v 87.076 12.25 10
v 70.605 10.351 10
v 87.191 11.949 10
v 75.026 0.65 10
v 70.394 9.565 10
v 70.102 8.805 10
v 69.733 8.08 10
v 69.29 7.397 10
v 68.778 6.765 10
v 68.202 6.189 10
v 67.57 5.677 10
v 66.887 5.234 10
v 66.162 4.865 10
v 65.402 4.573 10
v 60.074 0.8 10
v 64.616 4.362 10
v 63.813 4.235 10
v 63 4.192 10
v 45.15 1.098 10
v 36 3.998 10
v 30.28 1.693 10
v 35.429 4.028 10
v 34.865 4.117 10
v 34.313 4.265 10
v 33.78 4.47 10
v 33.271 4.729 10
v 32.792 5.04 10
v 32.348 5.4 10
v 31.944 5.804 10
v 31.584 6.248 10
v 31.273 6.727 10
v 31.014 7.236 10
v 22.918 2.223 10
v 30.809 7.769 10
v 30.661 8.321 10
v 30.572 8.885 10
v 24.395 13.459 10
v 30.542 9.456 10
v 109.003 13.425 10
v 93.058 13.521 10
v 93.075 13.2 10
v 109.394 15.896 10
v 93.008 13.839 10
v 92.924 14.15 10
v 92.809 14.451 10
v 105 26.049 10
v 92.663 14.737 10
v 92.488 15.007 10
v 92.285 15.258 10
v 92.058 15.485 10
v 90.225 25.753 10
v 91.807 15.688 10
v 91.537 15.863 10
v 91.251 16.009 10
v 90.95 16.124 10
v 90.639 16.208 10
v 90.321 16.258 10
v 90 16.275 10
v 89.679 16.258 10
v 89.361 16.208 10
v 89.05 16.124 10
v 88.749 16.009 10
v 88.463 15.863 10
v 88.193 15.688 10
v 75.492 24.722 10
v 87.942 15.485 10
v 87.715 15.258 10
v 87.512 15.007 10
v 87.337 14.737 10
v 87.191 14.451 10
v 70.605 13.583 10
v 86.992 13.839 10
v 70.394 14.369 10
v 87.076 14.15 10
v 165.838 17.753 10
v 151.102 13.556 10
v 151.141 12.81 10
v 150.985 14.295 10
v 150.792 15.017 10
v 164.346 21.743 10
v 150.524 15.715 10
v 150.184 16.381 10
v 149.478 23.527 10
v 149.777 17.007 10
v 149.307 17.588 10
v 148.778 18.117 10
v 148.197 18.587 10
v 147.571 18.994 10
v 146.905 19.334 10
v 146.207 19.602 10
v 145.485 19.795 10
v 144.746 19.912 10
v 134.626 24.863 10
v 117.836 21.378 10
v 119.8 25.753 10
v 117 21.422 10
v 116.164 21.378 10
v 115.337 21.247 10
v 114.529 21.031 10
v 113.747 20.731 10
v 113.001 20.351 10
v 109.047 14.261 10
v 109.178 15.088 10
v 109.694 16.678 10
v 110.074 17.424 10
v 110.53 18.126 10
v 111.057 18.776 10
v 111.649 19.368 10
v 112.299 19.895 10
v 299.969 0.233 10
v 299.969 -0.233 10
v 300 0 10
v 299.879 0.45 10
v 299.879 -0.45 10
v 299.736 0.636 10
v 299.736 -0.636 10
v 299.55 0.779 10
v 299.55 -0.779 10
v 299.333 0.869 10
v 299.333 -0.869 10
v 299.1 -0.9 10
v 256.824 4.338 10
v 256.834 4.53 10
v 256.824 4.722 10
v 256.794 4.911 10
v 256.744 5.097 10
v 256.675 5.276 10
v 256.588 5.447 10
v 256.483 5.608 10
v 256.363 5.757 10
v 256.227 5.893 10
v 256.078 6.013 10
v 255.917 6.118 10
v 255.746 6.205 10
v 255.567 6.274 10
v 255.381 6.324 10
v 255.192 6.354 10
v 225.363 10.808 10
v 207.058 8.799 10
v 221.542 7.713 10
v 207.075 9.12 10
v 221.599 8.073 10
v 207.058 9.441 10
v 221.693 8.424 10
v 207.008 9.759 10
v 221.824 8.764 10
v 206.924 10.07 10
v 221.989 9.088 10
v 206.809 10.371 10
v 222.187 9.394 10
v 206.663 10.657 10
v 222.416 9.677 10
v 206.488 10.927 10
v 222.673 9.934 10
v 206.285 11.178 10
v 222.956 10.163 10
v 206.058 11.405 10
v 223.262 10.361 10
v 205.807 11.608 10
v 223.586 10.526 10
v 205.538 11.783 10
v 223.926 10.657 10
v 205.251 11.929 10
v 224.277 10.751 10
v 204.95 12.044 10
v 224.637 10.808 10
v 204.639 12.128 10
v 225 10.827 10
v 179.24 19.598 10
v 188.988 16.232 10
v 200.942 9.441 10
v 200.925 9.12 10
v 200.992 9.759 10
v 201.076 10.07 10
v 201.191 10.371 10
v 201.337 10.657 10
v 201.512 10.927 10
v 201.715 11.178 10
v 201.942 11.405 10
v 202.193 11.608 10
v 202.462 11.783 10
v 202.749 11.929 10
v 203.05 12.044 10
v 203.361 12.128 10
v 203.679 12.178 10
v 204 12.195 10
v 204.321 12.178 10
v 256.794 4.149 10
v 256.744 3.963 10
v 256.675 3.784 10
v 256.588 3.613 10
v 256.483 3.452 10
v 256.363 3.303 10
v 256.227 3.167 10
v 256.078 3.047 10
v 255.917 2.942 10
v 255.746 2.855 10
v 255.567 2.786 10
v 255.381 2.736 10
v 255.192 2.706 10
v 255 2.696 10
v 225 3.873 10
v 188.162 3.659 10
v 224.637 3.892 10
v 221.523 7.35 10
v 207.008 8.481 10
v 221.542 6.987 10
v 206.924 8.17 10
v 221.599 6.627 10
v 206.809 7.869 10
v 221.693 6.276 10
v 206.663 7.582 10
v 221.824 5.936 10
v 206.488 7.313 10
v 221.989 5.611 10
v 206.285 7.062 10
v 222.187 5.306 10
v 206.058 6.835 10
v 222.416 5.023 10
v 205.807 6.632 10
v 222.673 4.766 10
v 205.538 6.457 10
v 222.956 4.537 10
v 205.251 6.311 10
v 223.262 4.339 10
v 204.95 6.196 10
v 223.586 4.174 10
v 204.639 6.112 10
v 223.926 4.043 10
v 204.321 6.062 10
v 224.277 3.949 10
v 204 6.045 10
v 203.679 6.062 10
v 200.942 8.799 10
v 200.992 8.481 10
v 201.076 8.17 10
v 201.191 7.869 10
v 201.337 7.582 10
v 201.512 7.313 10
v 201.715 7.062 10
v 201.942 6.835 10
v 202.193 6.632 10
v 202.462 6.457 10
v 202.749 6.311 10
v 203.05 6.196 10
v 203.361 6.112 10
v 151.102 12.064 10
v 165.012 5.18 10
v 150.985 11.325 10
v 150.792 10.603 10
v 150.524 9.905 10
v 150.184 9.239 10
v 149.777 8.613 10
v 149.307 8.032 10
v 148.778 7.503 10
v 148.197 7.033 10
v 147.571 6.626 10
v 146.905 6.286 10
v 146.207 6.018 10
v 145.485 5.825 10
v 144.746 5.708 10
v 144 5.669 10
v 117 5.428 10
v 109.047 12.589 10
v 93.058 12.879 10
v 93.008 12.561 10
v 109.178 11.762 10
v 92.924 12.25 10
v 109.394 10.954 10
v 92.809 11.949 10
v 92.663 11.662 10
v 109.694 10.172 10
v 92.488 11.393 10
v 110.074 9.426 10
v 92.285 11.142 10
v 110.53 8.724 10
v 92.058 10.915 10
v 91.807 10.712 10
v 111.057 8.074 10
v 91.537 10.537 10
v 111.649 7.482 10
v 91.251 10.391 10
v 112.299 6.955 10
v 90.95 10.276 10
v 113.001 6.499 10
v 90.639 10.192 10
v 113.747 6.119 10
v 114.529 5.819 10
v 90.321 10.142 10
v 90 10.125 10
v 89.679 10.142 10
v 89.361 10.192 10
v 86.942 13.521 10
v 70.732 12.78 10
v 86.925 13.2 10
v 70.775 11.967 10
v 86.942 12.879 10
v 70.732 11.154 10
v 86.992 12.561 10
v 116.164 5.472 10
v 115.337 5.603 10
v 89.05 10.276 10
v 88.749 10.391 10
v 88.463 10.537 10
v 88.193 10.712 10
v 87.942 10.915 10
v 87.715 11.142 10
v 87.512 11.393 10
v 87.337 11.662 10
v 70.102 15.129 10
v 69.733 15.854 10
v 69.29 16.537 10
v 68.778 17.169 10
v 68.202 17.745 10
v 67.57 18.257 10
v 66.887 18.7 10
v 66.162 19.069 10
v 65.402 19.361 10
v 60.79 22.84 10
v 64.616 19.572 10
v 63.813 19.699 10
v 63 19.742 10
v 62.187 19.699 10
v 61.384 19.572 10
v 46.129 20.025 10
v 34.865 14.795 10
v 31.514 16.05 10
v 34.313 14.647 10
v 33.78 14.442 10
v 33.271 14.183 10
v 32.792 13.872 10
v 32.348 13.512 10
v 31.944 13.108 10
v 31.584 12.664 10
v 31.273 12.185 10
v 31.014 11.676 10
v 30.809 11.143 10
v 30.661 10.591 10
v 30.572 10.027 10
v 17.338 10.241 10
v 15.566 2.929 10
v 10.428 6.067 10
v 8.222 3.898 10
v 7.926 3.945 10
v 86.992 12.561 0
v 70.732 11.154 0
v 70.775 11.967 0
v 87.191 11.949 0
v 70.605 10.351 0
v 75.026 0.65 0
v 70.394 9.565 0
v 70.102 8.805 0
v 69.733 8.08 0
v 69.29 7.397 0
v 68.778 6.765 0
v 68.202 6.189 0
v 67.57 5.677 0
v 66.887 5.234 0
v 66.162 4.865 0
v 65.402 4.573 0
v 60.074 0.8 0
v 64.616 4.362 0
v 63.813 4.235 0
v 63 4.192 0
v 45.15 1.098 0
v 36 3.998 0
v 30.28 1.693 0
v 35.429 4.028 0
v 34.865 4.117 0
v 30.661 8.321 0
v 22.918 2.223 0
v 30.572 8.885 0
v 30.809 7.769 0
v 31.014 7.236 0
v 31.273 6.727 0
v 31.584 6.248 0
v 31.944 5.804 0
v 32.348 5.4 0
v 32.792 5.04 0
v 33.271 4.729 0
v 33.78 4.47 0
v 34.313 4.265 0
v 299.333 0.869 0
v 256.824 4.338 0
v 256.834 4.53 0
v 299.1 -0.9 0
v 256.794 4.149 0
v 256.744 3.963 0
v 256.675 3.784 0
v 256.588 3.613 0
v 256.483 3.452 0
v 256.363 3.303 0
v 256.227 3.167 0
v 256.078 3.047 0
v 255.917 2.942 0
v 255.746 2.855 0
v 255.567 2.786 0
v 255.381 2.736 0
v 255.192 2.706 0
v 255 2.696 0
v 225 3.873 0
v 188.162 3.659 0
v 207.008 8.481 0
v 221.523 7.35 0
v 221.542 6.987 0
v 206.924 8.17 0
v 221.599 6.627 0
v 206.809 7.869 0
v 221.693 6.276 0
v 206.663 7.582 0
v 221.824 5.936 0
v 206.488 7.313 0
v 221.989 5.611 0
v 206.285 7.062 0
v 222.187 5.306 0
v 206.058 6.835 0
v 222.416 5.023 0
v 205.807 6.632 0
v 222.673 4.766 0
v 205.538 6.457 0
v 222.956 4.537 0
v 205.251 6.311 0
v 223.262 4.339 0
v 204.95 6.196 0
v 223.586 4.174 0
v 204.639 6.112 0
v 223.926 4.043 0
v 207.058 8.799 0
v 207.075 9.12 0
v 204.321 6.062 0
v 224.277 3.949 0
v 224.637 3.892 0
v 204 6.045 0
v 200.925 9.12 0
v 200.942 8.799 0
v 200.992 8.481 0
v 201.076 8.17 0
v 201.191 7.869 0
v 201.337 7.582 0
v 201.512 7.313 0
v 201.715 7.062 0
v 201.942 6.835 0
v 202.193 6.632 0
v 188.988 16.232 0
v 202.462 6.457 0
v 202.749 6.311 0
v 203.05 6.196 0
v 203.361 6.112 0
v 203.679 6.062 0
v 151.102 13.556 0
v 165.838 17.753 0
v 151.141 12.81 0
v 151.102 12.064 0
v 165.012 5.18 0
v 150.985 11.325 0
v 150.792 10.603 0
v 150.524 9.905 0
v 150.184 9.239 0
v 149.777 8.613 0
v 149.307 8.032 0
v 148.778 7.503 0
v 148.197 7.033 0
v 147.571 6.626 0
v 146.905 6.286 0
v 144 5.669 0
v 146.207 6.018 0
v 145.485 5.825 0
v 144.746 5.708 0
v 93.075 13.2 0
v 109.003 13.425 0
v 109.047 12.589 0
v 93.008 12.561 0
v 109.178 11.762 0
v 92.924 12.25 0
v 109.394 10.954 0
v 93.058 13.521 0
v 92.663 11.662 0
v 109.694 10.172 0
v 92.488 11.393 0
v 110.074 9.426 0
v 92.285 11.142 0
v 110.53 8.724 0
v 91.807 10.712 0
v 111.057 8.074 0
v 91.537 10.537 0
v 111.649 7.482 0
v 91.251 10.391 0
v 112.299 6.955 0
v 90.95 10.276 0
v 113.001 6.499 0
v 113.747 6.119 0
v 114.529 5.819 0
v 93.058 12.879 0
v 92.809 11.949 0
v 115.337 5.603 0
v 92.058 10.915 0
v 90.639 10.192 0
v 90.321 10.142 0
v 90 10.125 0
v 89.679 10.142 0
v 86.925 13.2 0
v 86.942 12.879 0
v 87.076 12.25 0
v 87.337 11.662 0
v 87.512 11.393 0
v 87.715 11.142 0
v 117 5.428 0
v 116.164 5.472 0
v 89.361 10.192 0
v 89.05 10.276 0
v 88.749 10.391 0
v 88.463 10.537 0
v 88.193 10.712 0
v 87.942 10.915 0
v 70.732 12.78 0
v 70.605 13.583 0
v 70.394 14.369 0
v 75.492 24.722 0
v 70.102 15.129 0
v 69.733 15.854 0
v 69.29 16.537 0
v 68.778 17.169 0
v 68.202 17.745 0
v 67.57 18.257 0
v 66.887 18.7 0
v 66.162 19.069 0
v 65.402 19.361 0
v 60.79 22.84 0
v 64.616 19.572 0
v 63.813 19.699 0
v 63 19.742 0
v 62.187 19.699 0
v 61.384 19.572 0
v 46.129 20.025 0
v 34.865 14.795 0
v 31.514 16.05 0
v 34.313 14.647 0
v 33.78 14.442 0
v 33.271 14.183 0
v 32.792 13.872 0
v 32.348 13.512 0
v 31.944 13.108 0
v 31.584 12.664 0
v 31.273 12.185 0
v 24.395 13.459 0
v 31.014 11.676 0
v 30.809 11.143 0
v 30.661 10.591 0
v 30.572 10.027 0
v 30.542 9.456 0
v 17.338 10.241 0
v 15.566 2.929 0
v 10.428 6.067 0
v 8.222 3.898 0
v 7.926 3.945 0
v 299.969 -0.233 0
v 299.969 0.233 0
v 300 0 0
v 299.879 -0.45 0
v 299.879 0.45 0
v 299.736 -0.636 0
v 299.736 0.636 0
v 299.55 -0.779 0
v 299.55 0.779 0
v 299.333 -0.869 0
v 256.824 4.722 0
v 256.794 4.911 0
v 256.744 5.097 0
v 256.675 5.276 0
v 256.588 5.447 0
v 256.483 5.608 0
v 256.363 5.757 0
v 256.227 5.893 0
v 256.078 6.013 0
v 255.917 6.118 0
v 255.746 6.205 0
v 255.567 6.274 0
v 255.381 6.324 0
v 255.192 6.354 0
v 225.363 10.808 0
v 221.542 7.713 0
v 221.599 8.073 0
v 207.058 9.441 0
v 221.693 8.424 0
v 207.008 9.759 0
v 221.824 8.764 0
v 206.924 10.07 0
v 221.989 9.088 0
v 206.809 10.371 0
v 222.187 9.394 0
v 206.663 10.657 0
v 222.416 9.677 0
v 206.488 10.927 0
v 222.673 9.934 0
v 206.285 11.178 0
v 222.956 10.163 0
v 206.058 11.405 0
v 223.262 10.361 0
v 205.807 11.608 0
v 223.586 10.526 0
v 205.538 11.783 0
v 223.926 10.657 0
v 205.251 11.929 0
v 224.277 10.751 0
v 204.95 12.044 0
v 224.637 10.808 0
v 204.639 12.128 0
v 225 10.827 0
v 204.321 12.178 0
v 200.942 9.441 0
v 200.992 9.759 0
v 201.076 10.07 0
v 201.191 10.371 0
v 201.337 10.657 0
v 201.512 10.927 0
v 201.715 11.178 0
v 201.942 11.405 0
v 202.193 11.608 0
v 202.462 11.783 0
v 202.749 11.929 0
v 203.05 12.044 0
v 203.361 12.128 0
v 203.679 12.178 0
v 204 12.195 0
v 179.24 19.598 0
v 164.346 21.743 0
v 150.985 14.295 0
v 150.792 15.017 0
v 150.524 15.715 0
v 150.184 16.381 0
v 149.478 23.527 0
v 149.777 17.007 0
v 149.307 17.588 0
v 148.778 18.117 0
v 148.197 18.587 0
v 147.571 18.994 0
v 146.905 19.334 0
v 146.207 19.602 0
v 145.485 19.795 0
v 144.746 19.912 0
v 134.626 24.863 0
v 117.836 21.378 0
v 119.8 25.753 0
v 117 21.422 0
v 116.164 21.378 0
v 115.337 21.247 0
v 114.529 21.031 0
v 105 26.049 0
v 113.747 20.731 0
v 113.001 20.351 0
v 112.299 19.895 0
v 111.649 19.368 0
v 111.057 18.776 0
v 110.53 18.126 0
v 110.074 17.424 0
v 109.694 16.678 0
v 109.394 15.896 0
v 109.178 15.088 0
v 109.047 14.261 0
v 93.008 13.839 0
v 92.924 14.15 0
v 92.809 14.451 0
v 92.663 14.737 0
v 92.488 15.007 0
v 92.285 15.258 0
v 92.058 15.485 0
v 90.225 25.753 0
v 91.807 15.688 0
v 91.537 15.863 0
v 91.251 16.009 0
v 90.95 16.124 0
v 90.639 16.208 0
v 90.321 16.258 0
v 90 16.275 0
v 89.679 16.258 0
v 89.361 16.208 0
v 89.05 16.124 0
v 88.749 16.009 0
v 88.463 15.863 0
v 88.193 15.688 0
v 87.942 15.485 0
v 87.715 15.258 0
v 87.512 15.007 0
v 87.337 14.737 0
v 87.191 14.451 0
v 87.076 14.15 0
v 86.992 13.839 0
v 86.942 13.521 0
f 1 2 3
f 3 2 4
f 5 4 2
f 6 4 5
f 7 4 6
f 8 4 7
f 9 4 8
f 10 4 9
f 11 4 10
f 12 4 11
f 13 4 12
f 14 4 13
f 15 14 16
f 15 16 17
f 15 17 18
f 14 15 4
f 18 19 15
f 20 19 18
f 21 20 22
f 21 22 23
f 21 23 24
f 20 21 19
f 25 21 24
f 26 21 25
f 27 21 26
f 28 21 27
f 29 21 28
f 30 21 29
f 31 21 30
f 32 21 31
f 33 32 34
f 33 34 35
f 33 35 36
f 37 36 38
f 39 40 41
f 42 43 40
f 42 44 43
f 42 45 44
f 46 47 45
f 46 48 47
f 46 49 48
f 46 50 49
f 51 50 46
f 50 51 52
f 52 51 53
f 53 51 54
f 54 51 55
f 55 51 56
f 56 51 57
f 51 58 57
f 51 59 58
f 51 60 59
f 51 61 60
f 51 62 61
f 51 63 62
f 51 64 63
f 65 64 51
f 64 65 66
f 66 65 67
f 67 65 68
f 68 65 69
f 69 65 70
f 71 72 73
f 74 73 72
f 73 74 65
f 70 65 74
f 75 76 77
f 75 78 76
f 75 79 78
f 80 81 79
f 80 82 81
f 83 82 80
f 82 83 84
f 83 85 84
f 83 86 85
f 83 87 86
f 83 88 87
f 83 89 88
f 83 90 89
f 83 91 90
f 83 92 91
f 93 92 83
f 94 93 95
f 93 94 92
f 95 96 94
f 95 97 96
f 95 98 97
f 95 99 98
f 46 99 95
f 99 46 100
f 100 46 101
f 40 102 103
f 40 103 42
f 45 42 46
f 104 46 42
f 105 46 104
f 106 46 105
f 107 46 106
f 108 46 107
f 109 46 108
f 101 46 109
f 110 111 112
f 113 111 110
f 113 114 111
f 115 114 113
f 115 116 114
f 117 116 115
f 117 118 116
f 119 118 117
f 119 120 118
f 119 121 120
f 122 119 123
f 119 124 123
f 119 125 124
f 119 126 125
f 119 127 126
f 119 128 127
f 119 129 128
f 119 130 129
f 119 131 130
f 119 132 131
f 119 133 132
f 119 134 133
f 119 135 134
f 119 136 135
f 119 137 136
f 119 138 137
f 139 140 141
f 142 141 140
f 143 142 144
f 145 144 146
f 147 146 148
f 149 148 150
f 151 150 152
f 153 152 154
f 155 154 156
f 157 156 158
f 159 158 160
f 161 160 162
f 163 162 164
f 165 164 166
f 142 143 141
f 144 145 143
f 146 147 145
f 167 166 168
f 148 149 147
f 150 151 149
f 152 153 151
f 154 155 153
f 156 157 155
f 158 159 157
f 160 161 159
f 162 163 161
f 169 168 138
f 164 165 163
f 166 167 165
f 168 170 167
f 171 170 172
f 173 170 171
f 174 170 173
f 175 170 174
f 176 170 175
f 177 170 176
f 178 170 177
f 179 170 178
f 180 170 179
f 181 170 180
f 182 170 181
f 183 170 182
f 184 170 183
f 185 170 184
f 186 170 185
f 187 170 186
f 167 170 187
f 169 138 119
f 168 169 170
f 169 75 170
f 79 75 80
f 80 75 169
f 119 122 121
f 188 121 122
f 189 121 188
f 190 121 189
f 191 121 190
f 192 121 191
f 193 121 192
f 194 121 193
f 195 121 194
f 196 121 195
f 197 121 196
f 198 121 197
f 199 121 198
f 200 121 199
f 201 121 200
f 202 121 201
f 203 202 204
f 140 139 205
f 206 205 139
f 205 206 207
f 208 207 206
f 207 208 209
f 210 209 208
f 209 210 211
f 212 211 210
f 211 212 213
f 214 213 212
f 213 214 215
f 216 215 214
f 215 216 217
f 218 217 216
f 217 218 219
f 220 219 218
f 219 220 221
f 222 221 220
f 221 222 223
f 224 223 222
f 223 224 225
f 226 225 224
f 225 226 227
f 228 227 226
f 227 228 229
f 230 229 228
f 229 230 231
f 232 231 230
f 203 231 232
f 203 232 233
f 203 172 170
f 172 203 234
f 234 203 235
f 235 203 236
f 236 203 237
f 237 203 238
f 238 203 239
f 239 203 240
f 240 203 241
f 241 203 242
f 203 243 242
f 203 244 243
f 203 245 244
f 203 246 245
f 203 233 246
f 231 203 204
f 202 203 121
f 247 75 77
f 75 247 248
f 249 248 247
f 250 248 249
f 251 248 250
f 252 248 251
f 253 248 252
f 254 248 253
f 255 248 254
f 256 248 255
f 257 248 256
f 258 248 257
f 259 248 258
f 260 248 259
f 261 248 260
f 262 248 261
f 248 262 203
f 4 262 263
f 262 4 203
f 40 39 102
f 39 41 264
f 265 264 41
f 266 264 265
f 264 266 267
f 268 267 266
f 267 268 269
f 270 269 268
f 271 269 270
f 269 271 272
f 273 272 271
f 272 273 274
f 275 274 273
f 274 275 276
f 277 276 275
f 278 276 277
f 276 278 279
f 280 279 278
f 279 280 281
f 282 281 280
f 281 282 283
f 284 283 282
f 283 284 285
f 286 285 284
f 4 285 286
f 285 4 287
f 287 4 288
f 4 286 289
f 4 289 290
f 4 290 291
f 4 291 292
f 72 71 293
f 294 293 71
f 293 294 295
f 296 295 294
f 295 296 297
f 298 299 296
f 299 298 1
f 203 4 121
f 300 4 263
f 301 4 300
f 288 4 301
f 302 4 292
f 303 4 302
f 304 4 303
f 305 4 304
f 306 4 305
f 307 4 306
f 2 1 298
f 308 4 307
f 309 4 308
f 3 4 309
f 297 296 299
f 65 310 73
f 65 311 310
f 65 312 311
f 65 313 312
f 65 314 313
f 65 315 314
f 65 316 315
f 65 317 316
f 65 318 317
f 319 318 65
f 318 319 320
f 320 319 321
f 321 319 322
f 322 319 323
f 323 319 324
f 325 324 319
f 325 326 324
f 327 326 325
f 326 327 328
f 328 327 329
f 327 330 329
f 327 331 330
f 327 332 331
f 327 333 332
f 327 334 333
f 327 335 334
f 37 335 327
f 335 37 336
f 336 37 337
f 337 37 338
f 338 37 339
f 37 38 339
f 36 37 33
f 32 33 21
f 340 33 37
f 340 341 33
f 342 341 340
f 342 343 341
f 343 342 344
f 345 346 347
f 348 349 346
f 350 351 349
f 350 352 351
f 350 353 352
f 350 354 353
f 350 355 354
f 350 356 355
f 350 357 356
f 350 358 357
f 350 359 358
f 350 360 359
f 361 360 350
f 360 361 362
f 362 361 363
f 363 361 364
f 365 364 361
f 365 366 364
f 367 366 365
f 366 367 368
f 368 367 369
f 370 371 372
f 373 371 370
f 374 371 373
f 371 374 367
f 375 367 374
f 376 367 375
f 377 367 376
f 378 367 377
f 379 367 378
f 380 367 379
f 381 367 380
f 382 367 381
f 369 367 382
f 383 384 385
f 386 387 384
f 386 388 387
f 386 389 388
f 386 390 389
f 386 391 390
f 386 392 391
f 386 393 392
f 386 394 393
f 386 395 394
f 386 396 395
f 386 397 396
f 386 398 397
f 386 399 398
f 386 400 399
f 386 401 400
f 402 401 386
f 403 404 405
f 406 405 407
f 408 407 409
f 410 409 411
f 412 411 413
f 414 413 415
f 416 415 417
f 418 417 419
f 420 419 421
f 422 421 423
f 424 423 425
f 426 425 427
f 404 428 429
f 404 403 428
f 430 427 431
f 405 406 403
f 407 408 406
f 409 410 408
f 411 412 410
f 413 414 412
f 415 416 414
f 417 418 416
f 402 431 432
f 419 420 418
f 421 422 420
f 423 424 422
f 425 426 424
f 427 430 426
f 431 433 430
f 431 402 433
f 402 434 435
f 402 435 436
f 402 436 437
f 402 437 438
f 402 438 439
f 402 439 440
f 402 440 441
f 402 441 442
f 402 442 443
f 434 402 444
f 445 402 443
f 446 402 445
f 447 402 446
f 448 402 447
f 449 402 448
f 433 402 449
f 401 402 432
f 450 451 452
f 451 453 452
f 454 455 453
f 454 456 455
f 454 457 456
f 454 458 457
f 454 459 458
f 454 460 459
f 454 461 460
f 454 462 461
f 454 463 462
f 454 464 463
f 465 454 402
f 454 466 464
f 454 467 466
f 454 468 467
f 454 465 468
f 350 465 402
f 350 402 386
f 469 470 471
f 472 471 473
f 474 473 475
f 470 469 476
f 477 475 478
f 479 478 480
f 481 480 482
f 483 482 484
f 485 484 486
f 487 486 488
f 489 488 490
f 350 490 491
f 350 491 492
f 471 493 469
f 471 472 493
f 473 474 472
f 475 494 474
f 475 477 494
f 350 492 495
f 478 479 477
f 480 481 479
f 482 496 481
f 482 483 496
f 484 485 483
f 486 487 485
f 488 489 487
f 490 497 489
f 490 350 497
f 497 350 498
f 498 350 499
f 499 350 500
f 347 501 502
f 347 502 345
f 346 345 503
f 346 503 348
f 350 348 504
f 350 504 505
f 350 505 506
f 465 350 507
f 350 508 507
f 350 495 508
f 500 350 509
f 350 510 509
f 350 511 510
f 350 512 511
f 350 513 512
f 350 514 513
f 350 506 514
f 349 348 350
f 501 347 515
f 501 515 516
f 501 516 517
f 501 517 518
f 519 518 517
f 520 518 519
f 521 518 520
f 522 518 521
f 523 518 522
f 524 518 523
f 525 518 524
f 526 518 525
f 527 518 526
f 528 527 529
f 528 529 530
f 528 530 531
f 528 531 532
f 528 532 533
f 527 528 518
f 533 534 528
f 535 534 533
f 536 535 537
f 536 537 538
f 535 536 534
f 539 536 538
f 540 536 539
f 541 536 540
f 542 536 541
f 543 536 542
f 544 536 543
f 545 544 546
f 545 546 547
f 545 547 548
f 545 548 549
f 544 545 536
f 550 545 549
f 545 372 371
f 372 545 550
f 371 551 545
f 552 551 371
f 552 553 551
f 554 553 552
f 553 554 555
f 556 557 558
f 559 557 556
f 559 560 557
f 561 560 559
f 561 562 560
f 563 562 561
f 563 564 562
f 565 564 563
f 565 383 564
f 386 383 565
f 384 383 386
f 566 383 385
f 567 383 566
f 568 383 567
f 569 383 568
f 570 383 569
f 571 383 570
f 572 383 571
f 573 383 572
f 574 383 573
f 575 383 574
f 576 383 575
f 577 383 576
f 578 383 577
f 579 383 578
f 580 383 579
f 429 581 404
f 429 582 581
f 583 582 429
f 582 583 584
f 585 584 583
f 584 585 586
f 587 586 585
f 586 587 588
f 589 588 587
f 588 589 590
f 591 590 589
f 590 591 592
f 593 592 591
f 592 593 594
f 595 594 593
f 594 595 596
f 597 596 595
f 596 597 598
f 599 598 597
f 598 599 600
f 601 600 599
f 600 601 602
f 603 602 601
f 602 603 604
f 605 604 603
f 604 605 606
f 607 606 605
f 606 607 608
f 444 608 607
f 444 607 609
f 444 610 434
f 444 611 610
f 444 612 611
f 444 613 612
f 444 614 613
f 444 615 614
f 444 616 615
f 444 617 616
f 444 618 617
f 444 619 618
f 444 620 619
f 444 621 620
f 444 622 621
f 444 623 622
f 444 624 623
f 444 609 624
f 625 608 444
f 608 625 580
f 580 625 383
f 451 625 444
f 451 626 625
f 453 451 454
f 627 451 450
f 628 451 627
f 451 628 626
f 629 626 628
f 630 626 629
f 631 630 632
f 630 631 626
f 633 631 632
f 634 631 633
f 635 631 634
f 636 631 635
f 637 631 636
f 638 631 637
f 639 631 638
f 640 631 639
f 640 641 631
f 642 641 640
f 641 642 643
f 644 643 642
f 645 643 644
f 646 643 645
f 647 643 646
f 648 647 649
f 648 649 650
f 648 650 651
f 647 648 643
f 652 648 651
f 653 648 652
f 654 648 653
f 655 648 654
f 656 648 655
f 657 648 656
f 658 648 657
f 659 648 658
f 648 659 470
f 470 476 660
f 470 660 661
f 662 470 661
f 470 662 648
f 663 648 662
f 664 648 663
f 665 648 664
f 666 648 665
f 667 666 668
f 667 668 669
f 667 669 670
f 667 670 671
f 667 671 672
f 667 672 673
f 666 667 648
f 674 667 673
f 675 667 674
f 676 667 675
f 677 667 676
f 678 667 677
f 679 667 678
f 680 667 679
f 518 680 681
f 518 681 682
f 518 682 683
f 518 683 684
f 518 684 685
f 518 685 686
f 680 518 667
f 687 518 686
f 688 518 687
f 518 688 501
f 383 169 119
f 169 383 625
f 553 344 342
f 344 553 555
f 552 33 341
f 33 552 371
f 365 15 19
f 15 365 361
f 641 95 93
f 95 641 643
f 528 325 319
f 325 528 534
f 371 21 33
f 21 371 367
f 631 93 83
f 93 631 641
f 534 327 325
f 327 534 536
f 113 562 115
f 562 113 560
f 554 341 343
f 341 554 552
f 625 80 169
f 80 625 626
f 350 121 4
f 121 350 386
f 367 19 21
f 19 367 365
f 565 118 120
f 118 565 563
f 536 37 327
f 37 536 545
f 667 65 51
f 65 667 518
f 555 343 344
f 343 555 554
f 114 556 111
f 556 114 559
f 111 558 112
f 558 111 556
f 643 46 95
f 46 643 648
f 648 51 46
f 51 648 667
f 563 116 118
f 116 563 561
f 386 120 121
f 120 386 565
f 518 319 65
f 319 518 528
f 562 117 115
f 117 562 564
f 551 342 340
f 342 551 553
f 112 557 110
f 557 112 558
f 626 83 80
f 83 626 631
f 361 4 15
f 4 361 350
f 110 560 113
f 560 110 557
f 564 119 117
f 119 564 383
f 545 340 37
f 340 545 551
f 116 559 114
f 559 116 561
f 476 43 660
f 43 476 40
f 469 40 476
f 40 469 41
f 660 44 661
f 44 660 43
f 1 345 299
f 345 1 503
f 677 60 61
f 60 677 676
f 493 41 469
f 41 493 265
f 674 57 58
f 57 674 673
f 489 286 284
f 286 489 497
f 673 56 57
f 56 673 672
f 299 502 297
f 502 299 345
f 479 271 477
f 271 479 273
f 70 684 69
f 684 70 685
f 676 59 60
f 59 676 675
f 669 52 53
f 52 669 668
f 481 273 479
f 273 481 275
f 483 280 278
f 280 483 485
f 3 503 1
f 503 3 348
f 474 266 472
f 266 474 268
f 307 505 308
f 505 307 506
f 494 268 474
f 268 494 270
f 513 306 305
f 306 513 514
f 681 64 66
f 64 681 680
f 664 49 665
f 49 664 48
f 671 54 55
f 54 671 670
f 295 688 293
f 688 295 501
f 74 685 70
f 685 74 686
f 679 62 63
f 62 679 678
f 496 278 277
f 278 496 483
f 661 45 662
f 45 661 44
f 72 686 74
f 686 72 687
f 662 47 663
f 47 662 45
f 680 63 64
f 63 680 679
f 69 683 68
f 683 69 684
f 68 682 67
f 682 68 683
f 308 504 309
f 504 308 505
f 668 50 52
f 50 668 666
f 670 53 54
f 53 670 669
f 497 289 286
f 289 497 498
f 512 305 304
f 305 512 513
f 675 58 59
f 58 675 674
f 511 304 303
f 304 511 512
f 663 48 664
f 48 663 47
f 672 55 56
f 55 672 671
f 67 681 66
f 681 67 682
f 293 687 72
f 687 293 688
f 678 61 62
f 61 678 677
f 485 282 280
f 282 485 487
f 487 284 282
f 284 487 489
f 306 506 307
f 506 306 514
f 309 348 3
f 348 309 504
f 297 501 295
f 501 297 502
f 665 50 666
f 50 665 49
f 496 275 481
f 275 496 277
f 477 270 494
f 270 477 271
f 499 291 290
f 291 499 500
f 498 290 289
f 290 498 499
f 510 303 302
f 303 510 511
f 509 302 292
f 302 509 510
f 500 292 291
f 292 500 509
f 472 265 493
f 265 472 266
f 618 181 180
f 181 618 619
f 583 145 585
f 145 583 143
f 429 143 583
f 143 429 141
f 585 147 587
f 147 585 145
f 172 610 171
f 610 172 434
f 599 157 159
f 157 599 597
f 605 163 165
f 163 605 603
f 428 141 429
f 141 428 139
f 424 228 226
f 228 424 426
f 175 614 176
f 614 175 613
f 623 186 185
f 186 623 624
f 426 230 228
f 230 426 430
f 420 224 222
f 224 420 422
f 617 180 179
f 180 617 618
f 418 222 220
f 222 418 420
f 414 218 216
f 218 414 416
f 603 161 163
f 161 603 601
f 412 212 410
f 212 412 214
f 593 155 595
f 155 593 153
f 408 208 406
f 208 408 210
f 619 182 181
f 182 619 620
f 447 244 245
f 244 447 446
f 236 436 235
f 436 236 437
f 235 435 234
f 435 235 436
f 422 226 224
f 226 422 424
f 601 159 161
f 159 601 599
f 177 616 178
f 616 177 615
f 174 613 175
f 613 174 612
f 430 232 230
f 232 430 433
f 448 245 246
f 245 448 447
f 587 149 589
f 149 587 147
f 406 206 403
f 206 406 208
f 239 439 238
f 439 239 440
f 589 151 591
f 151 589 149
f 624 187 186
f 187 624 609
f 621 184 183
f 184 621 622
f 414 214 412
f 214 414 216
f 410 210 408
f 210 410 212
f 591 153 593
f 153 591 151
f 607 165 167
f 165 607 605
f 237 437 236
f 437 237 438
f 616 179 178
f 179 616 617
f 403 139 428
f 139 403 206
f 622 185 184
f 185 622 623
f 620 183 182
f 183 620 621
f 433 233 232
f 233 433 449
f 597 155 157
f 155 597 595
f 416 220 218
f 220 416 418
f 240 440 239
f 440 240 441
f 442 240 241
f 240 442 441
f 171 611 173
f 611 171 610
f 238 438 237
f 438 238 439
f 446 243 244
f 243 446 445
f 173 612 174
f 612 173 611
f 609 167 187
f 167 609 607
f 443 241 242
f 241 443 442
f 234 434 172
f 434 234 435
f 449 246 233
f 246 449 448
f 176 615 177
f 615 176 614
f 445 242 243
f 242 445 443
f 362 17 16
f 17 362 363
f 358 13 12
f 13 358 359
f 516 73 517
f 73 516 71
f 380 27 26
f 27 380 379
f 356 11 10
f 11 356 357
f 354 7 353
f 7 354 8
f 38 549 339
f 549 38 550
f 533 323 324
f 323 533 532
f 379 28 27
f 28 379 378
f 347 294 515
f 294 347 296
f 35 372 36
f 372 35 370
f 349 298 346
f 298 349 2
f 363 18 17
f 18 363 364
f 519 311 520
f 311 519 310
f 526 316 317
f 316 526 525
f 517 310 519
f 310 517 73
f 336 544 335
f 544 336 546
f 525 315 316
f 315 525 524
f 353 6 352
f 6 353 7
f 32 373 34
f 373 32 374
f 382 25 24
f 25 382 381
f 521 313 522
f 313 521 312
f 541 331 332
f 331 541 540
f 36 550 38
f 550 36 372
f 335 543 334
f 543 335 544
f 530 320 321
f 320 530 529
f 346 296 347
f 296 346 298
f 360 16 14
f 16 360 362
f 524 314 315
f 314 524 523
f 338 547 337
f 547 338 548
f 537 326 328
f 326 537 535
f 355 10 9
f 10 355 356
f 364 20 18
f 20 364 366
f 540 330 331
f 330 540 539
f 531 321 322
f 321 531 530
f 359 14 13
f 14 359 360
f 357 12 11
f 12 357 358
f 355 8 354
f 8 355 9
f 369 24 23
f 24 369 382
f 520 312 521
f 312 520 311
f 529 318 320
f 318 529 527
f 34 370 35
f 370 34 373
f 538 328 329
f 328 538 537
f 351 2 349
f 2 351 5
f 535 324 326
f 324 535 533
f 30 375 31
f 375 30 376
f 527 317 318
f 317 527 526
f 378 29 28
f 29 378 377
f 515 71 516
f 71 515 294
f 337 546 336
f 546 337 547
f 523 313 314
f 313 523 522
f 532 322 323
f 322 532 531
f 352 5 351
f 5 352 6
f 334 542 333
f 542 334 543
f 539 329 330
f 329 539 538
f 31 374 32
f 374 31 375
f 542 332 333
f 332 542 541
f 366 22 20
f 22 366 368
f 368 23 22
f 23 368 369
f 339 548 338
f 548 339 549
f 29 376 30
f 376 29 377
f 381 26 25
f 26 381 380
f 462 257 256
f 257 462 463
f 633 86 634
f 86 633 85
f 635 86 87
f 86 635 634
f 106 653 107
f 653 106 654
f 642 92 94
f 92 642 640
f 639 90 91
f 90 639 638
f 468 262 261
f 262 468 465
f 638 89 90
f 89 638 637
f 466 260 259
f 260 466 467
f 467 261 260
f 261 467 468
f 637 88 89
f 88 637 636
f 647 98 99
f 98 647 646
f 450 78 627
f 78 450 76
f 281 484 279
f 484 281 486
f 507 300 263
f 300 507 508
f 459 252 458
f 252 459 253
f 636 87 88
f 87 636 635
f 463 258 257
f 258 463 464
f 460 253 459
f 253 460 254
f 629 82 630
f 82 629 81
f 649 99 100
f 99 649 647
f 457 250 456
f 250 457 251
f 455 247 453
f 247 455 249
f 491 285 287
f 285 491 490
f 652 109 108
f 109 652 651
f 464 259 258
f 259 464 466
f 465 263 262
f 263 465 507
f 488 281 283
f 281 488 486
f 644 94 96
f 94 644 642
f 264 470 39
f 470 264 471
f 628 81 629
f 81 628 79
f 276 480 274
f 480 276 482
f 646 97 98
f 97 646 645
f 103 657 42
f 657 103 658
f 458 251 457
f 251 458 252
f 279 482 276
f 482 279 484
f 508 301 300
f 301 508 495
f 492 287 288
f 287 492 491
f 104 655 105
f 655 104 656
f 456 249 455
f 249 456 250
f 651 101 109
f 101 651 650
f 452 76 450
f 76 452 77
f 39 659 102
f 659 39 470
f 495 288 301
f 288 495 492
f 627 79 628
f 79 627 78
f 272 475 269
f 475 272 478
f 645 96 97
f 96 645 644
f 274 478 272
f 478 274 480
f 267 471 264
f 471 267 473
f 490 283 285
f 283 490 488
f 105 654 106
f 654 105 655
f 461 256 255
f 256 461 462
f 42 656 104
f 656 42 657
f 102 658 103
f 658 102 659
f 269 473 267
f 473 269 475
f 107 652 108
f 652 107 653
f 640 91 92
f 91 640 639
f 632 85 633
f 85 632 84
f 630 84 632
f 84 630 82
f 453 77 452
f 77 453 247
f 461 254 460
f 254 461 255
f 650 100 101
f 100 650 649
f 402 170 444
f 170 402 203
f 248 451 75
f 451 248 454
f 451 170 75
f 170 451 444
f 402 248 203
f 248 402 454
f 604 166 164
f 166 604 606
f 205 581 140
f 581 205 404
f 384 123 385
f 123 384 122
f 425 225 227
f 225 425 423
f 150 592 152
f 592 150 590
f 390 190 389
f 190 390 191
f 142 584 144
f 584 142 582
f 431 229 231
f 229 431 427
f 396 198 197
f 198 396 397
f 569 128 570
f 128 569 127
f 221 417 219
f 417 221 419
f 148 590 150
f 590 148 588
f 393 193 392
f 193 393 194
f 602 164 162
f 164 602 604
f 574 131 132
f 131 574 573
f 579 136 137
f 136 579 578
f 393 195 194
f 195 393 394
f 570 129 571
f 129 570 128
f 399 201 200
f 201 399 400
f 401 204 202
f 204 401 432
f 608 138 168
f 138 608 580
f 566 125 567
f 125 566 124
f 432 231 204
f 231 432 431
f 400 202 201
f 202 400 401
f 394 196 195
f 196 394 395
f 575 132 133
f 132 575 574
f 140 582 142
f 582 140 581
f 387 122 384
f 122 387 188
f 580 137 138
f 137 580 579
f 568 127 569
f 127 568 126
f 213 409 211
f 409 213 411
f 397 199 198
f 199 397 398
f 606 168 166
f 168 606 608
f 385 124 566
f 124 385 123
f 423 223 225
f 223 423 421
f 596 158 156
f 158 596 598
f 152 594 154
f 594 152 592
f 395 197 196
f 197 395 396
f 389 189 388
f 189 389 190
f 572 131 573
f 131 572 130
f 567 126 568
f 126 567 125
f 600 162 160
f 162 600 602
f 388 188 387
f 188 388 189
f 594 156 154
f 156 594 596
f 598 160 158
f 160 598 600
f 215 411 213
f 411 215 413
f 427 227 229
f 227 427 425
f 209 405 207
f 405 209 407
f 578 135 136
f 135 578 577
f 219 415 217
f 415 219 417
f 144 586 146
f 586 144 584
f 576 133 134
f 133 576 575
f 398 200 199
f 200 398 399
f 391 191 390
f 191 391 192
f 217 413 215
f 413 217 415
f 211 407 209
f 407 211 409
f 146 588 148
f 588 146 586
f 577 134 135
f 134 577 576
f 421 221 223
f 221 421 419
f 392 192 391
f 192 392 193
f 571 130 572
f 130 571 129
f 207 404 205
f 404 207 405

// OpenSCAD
// ===================================================================
// Project: OpenStickFPV
// Component: 300mm Chord Clark Y Wing Rib (Camber-Aligned Servo Pocket)
// - Rotated the 9g micro-servo mounting pocket (`servo_angle_deg = -7.8`)
//   to follow the local Clark Y camber slope at 60% chord (X = 180.0mm)
// - Because the pocket tilts parallel to the upper surface taper, the
//   entire 23.2mm x 12.6mm servo bay and its 2.0mm framing walls stay
//   100% enclosed inside the inset rib without bulging or clipping the
//   upper/lower Clark Y surfaces
// - Extended rib cleanly all the way to the 300.0mm trailing edge tip
//   with zero gaps in the aileron section
// - Dual 6mm carbon fiber tube ports (main @ 30%, rear @ 68%)
// - Optional 9g micro-servo bay (toggle `include_servo`)
// ===================================================================

$fn = 60;

// --- Primary Wing Parameters ---
chord                = 300.0;  // Full wing chord in mm (300mm = 30cm)
rib_thickness        = 10.0;    // Print thickness (Z-height on build plate)
skin_thickness       = 5.0;    // Dollar Tree foam board thickness (5.0mm)
inset_skin           = true;   // true = offsets top/bottom surfaces for 5mm foam wrap

// --- Carbon Fiber Spar Spec (6mm OD Tubes) ---
spar_dia             = 6.15;   // 6.0mm tube + 0.15mm printer tolerance
main_spar_pos        = 0.30;   // 30% chord (90mm from LE) - peak thickness
rear_spar_pos        = 0.68;   // 68% chord (204mm from LE) - torsion/rear spar

// --- Optional 9g Micro-Servo Mount (Camber-Aligned Inside Clark Y) ---
include_servo        = true;   // Set `true` for servo bay ribs, `false` for standard ribs
servo_pos_ratio      = 0.59;   // 59% chord (177mm from LE - optimal envelope clearance)
servo_body_l         = 23.2;   // 9g servo body length
servo_body_w         = 12.6;   // 9g servo body width
servo_wall           = 2.0;    // Framing wall around servo pocket
servo_y_offset       = -0.4;   // Slight downward nudge toward flatter lower camber

// --- Lightening Holes & Wire Routing ---
wire_hole_dia        = 8.0;    // Pass-through hole for servo extension cable

// ===================================================================
// CLARK Y AIRFOIL COORDINATES (Normalized 0..1)
// ===================================================================
clark_y_upper = [
    [0.0000,  0.0000], [0.0050,  0.0145], [0.0125,  0.0232], [0.0250,  0.0338],
    [0.0500,  0.0489], [0.0750,  0.0603], [0.1000,  0.0694], [0.1500,  0.0830],
    [0.2000,  0.0926], [0.2500,  0.0990], [0.3000,  0.1025], [0.3500,  0.1035],
    [0.4000,  0.1025], [0.4500,  0.0995], [0.5000,  0.0950], [0.5500,  0.0890],
    [0.6000,  0.0818], [0.6500,  0.0736], [0.7000,  0.0646], [0.7500,  0.0550],
    [0.8000,  0.0448], [0.8500,  0.0342], [0.9000,  0.0233], [0.9500,  0.0120],
    [1.0000,  0.0000]
];

clark_y_lower = [
    [1.0000,  0.0000], [0.9500, -0.0020], [0.9000, -0.0030], [0.8500, -0.0040],
    [0.8000, -0.0050], [0.7500, -0.0060], [0.7000, -0.0070], [0.6500, -0.0080],
    [0.6000, -0.0090], [0.5500, -0.0100], [0.5000, -0.0110], [0.4500, -0.0120],
    [0.4000, -0.0130], [0.3500, -0.0140], [0.3000, -0.0145], [0.2500, -0.0145],
    [0.2000, -0.0140], [0.1500, -0.0130], [0.1000, -0.0110], [0.0750, -0.0092],
    [0.0500, -0.0068], [0.0250, -0.0035], [0.0125, -0.0015], [0.0050,  0.0000]
];

function scale_pts(pts, c) = [for (p = pts) [p[0] * c, p[1] * c]];

function interp_y(pts, nx) =
    let(
        idx = [for (i = [0 : len(pts) - 2]) if ((pts[i][0] <= nx && pts[i+1][0] >= nx) || (pts[i][0] >= nx && pts[i+1][0] <= nx)) i][0],
        p0 = pts[idx],
        p1 = pts[idx + 1],
        t = (p1[0] == p0[0]) ? 0 : (nx - p0[0]) / (p1[0] - p0[0])
    )
    p0[1] + t * (p1[1] - p0[1]);

function airfoil_mid_y(nx) = ((interp_y(clark_y_upper, nx) + interp_y(clark_y_lower, nx)) / 2) * chord;
function airfoil_thick(nx) = (interp_y(clark_y_upper, nx) - interp_y(clark_y_lower, nx)) * chord;

// Local camber-line slope angle (in degrees) across the servo span
function camber_angle_deg(nx, half_span_nx) =
    atan2(
        airfoil_mid_y(nx + half_span_nx) - airfoil_mid_y(nx - half_span_nx),
        2 * half_span_nx * chord
    );

// ===================================================================
// 2D RIB PROFILE GENERATOR (Full-Chord to X = 300.0mm)
// ===================================================================
module raw_airfoil_2d() {
    pts = concat(scale_pts(clark_y_upper, chord), scale_pts(clark_y_lower, chord));
    polygon(pts);
}

module full_chord_rib_2d() {
    if (inset_skin) {
        hull() {
            offset(r = -skin_thickness)
                raw_airfoil_2d();

            // Clean 1.8mm printable trailing-edge tip extending to X = 300.0mm
            translate([chord - 0.9, 0])
                circle(d = 1.8, $fn = 24);
        }
    } else {
        raw_airfoil_2d();
    }
}

// ===================================================================
// MAIN 3D WING RIB ASSEMBLY
// ===================================================================
module wing_rib_300mm_rotated_servo() {
    main_spar_x    = chord * main_spar_pos;
    main_spar_y    = airfoil_mid_y(main_spar_pos);

    rear_spar_x    = chord * rear_spar_pos;
    rear_spar_y    = airfoil_mid_y(rear_spar_pos);

    servo_x        = chord * servo_pos_ratio;
    servo_y        = airfoil_mid_y(servo_pos_ratio) + servo_y_offset;
    servo_rot_deg  = camber_angle_deg(servo_pos_ratio, (servo_body_l / 2) / chord);

    difference() {
        union() {
            // 1. Continuous Full-Chord Airfoil Rib (0mm to 300.0mm, Zero Gaps)
            linear_extrude(height = rib_thickness)
                full_chord_rib_2d();

            // 2. Reinforced Bosses Around 6mm Spars
            for (sp = [[main_spar_x, main_spar_y], [rear_spar_x, rear_spar_y]]) {
                translate([sp[0], sp[1], 0])
                    cylinder(d = spar_dia + 5.0, h = rib_thickness);
            }

            // 3. Optional 9g Servo Frame Boss (Rotated to Camber & Clipped to Rib)
            // Intersecting with full_chord_rib_2d() guarantees zero protrusion
            // outside the Clark Y perimeter even on the aft upper corner
            if (include_servo) {
                intersection() {
                    linear_extrude(height = rib_thickness)
                        full_chord_rib_2d();

                    translate([servo_x, servo_y, rib_thickness / 2])
                        rotate([0, 0, servo_rot_deg])
                            cube([servo_body_l + 2 * servo_wall, servo_body_w + 2 * servo_wall, rib_thickness], center = true);
                }
            }
        }

        // -------------------------------------------------------------
        // SUBTRACTIONS (Spar Holes, Lightening Cutouts, Servo)
        // -------------------------------------------------------------

        // A. 6mm Carbon Fiber Spar Holes
        for (sp = [[main_spar_x, main_spar_y], [rear_spar_x, rear_spar_y]]) {
            translate([sp[0], sp[1], -1])
                cylinder(d = spar_dia, h = rib_thickness + 2);
        }

        // B. Forward Lightening Cutout (Between LE and Main Spar)
        hull() {
            translate([chord * 0.12, airfoil_mid_y(0.12), -1])
                cylinder(d = airfoil_thick(0.12) * 0.42, h = rib_thickness + 2);
            translate([chord * 0.21, airfoil_mid_y(0.21), -1])
                cylinder(d = airfoil_thick(0.21) * 0.48, h = rib_thickness + 2);
        }

        // C. Mid-Bay Lightening Cutout (Ahead of Servo Bay)
        hull() {
            translate([chord * 0.39, airfoil_mid_y(0.39), -1])
                cylinder(d = airfoil_thick(0.39) * 0.46, h = rib_thickness + 2);
            translate([chord * 0.48, airfoil_mid_y(0.48), -1])
                cylinder(d = airfoil_thick(0.48) * 0.44, h = rib_thickness + 2);
        }

        // D. Optional 9g Servo Pocket (Rotated Parallel to Local Camber Line)
        // When `include_servo = false`, places a wire-routing hole in its place
        if (include_servo) {
            translate([servo_x, servo_y, rib_thickness / 2])
                rotate([0, 0, servo_rot_deg])
                    cube([servo_body_l, servo_body_w, rib_thickness + 2], center = true);
        } else {
            translate([servo_x, servo_y, -1])
                cylinder(d = wire_hole_dia, h = rib_thickness + 2);
        }

        // E. Aft Lightening Cutout (Behind Rear Spar)
        hull() {
            translate([chord * 0.75, airfoil_mid_y(0.75), -1])
                cylinder(d = airfoil_thick(0.75) * 0.38, h = rib_thickness + 2);
            translate([chord * 0.85, airfoil_mid_y(0.85), -1])
                cylinder(d = airfoil_thick(0.85) * 0.32, h = rib_thickness + 2);
        }
    }
}

wing_rib_300mm_rotated_servo();
